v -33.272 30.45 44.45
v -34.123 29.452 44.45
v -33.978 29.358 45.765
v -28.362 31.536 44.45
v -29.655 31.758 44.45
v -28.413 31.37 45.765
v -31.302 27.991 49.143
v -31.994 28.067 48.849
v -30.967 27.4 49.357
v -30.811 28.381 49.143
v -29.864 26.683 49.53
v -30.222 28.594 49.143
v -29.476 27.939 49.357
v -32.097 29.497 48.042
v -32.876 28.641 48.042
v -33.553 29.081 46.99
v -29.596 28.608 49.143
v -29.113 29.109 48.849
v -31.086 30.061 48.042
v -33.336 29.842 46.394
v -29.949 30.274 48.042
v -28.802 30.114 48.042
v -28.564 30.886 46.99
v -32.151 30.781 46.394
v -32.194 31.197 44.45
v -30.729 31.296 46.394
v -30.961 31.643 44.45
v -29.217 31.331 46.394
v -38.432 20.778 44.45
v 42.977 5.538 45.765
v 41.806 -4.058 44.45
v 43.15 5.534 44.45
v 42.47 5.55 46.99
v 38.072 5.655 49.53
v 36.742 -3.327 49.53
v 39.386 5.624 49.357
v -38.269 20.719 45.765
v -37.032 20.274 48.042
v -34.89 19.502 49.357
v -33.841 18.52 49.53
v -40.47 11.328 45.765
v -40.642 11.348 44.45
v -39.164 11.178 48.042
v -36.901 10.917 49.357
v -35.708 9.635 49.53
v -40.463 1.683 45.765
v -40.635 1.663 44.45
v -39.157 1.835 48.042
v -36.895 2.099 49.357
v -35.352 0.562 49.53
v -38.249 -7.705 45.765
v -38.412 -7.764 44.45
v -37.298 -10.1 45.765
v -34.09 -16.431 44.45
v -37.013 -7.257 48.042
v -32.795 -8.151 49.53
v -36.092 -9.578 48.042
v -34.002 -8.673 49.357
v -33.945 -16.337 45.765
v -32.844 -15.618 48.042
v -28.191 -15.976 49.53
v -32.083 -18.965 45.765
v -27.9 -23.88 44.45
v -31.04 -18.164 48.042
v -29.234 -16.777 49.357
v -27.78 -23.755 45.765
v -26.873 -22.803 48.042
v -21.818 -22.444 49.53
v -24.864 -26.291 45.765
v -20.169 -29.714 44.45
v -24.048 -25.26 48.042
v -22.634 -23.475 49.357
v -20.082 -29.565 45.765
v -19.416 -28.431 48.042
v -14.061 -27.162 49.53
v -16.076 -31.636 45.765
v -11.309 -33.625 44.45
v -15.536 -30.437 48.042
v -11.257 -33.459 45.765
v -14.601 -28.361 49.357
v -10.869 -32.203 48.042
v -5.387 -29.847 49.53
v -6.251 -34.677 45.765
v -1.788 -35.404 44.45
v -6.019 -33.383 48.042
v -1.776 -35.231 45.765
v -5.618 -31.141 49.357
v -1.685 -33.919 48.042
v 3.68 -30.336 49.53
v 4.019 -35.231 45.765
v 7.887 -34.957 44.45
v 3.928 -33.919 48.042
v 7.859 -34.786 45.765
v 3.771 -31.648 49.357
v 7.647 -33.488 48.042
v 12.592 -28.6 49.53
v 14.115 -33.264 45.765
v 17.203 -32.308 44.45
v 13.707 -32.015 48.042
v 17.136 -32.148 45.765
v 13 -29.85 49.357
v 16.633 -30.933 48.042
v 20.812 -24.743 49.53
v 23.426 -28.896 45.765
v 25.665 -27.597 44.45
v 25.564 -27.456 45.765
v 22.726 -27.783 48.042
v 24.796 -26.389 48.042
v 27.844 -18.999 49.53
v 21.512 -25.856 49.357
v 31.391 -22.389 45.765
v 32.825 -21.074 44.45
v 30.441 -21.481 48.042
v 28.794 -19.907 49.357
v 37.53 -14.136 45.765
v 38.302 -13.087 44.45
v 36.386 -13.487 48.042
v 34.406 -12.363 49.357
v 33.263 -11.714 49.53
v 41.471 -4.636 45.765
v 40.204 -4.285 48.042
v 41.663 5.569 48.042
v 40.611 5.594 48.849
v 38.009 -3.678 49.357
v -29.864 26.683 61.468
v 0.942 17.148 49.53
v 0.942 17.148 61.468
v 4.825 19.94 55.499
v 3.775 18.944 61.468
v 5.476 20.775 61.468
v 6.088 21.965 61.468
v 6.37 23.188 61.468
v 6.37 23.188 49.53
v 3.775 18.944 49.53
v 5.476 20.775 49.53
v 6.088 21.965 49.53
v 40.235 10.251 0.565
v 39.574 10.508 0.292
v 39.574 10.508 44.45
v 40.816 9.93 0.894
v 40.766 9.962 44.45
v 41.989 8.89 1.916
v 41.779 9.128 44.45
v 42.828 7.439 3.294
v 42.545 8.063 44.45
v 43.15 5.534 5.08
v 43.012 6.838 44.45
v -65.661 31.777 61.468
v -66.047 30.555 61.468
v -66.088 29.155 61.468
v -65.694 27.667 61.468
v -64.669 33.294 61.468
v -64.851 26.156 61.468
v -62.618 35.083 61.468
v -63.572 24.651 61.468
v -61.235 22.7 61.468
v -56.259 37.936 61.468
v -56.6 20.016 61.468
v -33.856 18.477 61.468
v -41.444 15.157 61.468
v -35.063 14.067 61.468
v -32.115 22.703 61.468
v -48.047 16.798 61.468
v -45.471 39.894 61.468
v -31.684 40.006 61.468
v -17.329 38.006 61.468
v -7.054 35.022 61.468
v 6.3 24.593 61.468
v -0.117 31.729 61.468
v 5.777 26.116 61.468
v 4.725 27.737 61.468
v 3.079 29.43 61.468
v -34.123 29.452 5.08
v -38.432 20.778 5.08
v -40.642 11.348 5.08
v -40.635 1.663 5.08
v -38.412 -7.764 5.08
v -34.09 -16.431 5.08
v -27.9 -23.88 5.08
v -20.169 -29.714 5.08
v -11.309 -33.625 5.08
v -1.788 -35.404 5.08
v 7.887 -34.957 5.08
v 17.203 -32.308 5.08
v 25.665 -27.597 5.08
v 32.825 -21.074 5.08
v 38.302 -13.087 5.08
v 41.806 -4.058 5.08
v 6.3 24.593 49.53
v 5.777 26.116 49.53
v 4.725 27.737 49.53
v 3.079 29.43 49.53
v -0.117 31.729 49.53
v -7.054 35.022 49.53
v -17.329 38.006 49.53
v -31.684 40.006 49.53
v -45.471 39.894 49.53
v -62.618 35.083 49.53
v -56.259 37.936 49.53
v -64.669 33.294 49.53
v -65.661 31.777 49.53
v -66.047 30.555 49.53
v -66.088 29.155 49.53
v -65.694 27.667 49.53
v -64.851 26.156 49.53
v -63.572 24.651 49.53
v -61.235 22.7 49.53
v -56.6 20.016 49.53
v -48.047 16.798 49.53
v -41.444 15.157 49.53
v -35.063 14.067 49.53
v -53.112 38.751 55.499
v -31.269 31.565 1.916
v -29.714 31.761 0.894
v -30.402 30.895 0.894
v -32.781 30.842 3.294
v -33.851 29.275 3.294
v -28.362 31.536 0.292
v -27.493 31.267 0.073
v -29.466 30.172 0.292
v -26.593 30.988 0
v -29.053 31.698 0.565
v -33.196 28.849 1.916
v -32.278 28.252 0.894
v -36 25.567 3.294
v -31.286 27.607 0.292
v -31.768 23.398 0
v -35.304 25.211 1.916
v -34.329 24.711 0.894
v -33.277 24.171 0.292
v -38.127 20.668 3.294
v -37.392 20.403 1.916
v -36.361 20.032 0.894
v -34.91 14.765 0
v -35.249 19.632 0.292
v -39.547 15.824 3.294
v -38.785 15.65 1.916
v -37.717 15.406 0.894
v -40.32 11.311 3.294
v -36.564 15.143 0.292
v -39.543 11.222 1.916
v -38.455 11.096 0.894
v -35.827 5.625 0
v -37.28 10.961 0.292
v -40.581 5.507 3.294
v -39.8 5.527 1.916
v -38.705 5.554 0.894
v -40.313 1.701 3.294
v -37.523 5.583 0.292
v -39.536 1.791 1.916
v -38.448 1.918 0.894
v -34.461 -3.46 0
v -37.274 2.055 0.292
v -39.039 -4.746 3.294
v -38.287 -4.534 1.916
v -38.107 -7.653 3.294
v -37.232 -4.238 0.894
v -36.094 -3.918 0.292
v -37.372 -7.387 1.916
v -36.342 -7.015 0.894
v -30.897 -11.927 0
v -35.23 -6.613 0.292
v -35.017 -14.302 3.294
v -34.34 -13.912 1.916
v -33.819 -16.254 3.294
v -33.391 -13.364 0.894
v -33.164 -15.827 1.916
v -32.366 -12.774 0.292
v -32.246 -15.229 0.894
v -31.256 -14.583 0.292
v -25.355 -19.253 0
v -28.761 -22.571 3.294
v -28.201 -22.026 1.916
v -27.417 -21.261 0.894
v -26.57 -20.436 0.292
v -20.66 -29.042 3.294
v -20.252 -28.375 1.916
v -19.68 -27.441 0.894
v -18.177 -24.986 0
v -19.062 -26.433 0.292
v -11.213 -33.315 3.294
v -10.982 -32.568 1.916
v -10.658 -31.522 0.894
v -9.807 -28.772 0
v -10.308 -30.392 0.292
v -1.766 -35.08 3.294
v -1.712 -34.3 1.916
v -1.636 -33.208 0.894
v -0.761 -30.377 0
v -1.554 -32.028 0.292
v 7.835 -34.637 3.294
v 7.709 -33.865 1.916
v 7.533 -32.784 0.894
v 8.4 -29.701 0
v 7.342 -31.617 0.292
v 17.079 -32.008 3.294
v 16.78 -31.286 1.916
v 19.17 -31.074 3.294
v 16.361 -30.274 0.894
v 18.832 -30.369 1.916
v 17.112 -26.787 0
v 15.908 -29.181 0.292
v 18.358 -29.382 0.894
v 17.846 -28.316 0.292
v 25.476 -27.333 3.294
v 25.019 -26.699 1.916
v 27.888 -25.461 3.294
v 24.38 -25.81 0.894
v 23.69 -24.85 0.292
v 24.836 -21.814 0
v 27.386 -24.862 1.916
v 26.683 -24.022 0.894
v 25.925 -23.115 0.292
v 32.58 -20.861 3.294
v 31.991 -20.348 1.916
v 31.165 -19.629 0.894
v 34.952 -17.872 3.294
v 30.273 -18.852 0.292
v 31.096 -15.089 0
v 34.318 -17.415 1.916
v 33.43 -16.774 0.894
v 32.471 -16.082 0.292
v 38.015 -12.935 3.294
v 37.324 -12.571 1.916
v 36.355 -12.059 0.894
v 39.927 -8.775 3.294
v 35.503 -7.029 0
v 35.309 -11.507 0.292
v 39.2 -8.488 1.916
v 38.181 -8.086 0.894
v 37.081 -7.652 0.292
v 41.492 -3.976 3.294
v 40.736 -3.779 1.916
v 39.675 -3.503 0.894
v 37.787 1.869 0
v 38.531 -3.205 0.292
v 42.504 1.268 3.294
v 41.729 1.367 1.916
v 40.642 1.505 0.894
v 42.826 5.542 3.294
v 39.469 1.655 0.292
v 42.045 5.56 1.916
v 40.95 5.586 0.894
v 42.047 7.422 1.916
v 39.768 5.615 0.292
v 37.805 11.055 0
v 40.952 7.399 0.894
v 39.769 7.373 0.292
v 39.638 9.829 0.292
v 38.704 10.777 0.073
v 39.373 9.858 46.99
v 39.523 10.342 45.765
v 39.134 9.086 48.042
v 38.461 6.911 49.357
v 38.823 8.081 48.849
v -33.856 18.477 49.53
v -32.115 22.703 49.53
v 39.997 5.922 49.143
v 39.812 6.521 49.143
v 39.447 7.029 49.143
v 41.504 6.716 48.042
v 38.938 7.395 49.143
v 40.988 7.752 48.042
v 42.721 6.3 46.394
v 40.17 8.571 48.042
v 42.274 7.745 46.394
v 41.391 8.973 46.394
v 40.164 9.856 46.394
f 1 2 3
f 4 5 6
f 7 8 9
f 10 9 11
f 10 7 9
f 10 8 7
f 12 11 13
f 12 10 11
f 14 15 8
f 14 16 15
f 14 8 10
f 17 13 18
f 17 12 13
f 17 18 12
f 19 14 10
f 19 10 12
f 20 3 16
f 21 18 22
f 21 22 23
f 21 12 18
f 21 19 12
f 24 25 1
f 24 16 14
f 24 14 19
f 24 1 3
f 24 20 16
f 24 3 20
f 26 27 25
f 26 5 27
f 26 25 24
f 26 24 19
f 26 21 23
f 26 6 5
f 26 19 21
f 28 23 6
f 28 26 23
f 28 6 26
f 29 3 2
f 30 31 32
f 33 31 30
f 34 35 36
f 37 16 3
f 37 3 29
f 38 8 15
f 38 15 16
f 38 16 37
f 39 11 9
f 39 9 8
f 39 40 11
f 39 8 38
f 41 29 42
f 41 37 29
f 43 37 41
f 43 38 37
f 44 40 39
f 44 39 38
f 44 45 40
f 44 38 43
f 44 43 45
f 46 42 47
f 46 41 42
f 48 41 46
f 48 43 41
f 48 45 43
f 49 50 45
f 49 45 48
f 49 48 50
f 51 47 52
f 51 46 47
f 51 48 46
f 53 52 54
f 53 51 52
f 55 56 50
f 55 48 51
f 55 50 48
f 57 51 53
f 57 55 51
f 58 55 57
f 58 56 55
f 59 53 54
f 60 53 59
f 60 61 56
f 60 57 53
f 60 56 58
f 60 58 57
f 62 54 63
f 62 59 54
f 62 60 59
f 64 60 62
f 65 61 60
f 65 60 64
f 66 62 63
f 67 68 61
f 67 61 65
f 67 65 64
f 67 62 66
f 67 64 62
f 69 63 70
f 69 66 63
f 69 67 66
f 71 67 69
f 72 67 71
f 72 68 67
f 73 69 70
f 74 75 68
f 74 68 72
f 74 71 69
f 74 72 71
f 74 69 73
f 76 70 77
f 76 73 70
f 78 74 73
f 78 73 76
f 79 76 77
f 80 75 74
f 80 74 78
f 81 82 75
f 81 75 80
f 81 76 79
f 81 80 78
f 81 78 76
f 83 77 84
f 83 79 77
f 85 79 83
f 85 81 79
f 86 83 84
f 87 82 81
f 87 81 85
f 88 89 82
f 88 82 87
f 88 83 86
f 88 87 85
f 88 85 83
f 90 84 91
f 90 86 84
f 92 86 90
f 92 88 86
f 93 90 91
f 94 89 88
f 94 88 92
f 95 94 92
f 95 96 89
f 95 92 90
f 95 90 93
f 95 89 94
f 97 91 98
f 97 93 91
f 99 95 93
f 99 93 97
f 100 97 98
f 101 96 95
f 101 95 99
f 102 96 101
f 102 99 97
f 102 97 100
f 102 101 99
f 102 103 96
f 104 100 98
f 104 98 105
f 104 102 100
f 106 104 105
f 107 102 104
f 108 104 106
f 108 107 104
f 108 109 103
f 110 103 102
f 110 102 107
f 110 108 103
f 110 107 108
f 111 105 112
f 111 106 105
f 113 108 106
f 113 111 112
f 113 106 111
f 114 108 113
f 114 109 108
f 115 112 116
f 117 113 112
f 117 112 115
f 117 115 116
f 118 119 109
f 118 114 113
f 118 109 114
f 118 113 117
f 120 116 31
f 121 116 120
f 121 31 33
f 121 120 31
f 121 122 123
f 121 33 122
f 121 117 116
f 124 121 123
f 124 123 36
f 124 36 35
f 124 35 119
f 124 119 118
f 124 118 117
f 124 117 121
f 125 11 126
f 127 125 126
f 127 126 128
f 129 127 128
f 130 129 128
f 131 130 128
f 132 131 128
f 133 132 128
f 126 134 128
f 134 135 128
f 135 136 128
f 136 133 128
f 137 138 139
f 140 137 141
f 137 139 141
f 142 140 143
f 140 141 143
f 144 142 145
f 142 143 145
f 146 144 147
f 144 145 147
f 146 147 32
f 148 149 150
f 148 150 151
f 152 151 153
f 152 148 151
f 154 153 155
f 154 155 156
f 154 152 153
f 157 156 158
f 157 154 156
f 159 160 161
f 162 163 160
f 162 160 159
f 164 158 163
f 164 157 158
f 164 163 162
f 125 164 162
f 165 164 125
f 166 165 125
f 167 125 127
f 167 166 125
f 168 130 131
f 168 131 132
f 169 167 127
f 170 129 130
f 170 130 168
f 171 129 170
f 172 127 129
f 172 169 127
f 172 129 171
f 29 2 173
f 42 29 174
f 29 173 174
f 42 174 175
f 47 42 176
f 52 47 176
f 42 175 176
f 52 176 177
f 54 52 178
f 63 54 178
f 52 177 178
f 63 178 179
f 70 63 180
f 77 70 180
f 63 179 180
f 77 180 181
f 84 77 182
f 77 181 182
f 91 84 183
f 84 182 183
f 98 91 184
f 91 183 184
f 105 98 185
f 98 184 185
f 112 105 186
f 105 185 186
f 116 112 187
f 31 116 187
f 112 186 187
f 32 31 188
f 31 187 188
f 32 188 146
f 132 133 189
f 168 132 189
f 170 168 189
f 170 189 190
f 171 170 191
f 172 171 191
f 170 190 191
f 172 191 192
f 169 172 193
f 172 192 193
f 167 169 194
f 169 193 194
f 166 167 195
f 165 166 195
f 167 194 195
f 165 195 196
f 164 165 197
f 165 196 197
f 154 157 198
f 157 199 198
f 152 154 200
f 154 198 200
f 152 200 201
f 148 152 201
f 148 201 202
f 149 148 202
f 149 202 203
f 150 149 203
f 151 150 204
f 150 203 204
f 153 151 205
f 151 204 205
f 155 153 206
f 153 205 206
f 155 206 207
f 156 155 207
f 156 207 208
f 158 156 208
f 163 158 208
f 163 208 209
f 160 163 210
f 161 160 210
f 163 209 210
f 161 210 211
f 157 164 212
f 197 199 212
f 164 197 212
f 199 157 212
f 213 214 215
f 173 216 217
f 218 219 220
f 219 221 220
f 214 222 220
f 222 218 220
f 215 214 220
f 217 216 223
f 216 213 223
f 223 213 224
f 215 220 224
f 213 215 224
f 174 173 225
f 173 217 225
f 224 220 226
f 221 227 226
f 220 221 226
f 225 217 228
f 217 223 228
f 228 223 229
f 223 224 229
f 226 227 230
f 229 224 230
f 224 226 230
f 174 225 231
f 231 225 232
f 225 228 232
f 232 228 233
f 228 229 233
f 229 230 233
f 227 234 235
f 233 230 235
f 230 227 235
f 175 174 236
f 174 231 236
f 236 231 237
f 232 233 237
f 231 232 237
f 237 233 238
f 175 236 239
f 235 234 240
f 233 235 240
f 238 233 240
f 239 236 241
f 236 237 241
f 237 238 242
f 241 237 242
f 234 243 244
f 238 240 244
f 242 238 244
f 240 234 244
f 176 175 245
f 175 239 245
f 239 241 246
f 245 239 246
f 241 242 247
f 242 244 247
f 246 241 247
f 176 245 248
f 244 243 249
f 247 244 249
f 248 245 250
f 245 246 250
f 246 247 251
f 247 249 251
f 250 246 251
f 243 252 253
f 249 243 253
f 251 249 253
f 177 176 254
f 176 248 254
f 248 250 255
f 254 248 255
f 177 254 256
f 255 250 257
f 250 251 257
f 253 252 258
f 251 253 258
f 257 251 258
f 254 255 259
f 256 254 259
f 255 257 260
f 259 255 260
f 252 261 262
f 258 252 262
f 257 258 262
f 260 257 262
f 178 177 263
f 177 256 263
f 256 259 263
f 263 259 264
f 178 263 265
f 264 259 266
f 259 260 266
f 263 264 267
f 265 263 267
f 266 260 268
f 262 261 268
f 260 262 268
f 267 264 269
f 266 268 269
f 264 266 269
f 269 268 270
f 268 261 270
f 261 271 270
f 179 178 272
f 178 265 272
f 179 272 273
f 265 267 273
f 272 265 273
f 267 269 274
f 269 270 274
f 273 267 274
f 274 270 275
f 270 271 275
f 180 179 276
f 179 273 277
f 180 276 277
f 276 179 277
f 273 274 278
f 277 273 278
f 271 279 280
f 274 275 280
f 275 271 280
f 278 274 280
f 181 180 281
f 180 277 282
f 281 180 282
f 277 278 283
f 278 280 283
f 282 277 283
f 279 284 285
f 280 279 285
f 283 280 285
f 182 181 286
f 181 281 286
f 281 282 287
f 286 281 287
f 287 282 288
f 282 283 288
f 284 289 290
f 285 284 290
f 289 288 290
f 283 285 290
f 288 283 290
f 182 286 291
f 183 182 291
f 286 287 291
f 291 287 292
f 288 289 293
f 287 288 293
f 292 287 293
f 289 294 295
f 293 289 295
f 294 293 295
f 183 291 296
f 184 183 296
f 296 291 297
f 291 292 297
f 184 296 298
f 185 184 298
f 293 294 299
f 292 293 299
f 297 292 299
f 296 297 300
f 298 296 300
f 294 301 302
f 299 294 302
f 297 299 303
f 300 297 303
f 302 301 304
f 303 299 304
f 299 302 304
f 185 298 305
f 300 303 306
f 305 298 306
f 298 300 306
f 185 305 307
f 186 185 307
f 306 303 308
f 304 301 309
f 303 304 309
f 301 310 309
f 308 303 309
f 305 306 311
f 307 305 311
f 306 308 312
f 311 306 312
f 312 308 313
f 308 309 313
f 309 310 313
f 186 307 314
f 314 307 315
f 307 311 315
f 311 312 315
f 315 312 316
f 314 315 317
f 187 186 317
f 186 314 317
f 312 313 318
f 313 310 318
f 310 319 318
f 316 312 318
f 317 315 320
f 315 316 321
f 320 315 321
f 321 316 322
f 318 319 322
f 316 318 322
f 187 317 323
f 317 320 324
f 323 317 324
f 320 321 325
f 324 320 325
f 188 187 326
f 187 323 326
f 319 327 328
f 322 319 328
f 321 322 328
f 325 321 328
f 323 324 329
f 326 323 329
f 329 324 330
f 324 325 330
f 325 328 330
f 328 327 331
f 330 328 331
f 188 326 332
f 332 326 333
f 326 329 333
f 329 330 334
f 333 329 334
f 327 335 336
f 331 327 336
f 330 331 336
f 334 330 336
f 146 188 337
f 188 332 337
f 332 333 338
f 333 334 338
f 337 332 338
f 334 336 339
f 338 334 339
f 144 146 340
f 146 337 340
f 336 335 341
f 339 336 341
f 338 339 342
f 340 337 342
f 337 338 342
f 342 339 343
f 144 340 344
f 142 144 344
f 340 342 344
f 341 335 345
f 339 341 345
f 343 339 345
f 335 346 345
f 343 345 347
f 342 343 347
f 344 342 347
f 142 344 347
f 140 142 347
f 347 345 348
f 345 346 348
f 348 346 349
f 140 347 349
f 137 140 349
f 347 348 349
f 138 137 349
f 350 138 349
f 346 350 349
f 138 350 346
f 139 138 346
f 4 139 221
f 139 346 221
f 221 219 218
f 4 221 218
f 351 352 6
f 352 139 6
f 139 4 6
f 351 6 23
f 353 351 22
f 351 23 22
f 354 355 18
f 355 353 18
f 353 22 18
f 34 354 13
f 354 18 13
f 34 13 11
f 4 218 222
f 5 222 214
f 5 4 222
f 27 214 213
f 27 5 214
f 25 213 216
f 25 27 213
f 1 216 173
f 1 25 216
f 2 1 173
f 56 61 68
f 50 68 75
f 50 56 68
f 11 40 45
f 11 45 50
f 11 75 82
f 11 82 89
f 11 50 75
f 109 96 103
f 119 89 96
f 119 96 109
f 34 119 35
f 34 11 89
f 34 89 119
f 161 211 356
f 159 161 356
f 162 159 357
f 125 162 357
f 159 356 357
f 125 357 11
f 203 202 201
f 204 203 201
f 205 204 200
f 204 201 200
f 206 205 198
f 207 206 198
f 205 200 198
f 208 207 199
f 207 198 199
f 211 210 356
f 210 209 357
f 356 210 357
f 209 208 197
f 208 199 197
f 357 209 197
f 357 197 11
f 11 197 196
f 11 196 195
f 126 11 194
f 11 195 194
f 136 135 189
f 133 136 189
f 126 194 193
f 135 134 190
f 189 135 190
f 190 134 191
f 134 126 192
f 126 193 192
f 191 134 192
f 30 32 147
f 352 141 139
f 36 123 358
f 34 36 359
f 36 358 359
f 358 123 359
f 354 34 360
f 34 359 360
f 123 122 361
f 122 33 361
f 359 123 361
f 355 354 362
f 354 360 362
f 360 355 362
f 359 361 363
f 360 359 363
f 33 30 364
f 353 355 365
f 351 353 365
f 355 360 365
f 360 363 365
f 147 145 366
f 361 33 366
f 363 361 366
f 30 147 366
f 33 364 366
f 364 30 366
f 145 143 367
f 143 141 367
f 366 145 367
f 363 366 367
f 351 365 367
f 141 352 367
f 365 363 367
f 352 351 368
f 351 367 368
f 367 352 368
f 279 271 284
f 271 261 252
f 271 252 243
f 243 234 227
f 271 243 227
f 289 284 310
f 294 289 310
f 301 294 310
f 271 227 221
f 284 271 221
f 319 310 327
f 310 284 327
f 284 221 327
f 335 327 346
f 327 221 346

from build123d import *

# Parameters (mm, degrees)
F1_DEPTH = 49.53
F2_R     = 5.08
F4_DEPTH = 11.938


with BuildPart() as f1:
    # F0 (on Top) → F1 (new body)
    with BuildSketch(Plane.XY):
        with BuildLine():
            Line((43.0627092719, 9.4279302284), (-31.8511165679, 32.6155424118))
            ThreePointArc((-31.8511165679, 32.6155424118), (-11.3086114149, -33.6248132086), (43.0627092719, 9.4279302284))
        make_face()
    extrude(amount=F1_DEPTH)

    # F2
    f2_edges = [f1.edges().sort_by_distance(p)[0] for p in [
        (-31.851117, 32.615542, 24.765),
        (43.062709, 9.42793, 24.765),
        (-11.308611, -33.624813, 0),
        (-11.308611, -33.624813, 49.53),
        (5.605796, 21.021736, 49.53),
    ]]
    fillet(f2_edges, radius=F2_R)


with BuildPart() as f4:
    # F3 (on face) → F4 (new body)
    with BuildSketch(Plane.XY.offset(49.53)):
        with BuildLine():
            add(Edge.make_bspline(
                [(0.9420125467, 17.1475086393), (6.034321274, 19.7053182027), (6.37022499, 23.1876131147)],
                knots=[5.7625529421, 5.7625529421, 5.7625529421, 6.2831853072, 6.2831853072, 6.2831853072], degree=2, weights=[1, 0.9663086455, 1]))
            add(Edge.make_bspline(
                [(6.37022499, 23.1876131147), (9.1943801366, 52.4654705209), (-53.1122305045, 38.7505630843), (-115.4188411457, 25.0356556478), (-35.0627385662, 14.0674049354)],
                knots=[0, 0, 0, 2.3016526269, 2.3016526269, 4.6033052537, 4.6033052537, 4.6033052537], degree=2, weights=[1, 0.4077330724, 1, 0.4077330724, 1]))
            ThreePointArc((-35.0627385662, 14.0674049354), (-33.0507486956, 20.6170728388), (-29.8643745853, 26.682818705))
            Line((-29.8643745853, 26.682818705), (0.9420125467, 17.1475086393))
        make_face()
    extrude(amount=F4_DEPTH)


solid = Compound([f1.part, f4.part])
